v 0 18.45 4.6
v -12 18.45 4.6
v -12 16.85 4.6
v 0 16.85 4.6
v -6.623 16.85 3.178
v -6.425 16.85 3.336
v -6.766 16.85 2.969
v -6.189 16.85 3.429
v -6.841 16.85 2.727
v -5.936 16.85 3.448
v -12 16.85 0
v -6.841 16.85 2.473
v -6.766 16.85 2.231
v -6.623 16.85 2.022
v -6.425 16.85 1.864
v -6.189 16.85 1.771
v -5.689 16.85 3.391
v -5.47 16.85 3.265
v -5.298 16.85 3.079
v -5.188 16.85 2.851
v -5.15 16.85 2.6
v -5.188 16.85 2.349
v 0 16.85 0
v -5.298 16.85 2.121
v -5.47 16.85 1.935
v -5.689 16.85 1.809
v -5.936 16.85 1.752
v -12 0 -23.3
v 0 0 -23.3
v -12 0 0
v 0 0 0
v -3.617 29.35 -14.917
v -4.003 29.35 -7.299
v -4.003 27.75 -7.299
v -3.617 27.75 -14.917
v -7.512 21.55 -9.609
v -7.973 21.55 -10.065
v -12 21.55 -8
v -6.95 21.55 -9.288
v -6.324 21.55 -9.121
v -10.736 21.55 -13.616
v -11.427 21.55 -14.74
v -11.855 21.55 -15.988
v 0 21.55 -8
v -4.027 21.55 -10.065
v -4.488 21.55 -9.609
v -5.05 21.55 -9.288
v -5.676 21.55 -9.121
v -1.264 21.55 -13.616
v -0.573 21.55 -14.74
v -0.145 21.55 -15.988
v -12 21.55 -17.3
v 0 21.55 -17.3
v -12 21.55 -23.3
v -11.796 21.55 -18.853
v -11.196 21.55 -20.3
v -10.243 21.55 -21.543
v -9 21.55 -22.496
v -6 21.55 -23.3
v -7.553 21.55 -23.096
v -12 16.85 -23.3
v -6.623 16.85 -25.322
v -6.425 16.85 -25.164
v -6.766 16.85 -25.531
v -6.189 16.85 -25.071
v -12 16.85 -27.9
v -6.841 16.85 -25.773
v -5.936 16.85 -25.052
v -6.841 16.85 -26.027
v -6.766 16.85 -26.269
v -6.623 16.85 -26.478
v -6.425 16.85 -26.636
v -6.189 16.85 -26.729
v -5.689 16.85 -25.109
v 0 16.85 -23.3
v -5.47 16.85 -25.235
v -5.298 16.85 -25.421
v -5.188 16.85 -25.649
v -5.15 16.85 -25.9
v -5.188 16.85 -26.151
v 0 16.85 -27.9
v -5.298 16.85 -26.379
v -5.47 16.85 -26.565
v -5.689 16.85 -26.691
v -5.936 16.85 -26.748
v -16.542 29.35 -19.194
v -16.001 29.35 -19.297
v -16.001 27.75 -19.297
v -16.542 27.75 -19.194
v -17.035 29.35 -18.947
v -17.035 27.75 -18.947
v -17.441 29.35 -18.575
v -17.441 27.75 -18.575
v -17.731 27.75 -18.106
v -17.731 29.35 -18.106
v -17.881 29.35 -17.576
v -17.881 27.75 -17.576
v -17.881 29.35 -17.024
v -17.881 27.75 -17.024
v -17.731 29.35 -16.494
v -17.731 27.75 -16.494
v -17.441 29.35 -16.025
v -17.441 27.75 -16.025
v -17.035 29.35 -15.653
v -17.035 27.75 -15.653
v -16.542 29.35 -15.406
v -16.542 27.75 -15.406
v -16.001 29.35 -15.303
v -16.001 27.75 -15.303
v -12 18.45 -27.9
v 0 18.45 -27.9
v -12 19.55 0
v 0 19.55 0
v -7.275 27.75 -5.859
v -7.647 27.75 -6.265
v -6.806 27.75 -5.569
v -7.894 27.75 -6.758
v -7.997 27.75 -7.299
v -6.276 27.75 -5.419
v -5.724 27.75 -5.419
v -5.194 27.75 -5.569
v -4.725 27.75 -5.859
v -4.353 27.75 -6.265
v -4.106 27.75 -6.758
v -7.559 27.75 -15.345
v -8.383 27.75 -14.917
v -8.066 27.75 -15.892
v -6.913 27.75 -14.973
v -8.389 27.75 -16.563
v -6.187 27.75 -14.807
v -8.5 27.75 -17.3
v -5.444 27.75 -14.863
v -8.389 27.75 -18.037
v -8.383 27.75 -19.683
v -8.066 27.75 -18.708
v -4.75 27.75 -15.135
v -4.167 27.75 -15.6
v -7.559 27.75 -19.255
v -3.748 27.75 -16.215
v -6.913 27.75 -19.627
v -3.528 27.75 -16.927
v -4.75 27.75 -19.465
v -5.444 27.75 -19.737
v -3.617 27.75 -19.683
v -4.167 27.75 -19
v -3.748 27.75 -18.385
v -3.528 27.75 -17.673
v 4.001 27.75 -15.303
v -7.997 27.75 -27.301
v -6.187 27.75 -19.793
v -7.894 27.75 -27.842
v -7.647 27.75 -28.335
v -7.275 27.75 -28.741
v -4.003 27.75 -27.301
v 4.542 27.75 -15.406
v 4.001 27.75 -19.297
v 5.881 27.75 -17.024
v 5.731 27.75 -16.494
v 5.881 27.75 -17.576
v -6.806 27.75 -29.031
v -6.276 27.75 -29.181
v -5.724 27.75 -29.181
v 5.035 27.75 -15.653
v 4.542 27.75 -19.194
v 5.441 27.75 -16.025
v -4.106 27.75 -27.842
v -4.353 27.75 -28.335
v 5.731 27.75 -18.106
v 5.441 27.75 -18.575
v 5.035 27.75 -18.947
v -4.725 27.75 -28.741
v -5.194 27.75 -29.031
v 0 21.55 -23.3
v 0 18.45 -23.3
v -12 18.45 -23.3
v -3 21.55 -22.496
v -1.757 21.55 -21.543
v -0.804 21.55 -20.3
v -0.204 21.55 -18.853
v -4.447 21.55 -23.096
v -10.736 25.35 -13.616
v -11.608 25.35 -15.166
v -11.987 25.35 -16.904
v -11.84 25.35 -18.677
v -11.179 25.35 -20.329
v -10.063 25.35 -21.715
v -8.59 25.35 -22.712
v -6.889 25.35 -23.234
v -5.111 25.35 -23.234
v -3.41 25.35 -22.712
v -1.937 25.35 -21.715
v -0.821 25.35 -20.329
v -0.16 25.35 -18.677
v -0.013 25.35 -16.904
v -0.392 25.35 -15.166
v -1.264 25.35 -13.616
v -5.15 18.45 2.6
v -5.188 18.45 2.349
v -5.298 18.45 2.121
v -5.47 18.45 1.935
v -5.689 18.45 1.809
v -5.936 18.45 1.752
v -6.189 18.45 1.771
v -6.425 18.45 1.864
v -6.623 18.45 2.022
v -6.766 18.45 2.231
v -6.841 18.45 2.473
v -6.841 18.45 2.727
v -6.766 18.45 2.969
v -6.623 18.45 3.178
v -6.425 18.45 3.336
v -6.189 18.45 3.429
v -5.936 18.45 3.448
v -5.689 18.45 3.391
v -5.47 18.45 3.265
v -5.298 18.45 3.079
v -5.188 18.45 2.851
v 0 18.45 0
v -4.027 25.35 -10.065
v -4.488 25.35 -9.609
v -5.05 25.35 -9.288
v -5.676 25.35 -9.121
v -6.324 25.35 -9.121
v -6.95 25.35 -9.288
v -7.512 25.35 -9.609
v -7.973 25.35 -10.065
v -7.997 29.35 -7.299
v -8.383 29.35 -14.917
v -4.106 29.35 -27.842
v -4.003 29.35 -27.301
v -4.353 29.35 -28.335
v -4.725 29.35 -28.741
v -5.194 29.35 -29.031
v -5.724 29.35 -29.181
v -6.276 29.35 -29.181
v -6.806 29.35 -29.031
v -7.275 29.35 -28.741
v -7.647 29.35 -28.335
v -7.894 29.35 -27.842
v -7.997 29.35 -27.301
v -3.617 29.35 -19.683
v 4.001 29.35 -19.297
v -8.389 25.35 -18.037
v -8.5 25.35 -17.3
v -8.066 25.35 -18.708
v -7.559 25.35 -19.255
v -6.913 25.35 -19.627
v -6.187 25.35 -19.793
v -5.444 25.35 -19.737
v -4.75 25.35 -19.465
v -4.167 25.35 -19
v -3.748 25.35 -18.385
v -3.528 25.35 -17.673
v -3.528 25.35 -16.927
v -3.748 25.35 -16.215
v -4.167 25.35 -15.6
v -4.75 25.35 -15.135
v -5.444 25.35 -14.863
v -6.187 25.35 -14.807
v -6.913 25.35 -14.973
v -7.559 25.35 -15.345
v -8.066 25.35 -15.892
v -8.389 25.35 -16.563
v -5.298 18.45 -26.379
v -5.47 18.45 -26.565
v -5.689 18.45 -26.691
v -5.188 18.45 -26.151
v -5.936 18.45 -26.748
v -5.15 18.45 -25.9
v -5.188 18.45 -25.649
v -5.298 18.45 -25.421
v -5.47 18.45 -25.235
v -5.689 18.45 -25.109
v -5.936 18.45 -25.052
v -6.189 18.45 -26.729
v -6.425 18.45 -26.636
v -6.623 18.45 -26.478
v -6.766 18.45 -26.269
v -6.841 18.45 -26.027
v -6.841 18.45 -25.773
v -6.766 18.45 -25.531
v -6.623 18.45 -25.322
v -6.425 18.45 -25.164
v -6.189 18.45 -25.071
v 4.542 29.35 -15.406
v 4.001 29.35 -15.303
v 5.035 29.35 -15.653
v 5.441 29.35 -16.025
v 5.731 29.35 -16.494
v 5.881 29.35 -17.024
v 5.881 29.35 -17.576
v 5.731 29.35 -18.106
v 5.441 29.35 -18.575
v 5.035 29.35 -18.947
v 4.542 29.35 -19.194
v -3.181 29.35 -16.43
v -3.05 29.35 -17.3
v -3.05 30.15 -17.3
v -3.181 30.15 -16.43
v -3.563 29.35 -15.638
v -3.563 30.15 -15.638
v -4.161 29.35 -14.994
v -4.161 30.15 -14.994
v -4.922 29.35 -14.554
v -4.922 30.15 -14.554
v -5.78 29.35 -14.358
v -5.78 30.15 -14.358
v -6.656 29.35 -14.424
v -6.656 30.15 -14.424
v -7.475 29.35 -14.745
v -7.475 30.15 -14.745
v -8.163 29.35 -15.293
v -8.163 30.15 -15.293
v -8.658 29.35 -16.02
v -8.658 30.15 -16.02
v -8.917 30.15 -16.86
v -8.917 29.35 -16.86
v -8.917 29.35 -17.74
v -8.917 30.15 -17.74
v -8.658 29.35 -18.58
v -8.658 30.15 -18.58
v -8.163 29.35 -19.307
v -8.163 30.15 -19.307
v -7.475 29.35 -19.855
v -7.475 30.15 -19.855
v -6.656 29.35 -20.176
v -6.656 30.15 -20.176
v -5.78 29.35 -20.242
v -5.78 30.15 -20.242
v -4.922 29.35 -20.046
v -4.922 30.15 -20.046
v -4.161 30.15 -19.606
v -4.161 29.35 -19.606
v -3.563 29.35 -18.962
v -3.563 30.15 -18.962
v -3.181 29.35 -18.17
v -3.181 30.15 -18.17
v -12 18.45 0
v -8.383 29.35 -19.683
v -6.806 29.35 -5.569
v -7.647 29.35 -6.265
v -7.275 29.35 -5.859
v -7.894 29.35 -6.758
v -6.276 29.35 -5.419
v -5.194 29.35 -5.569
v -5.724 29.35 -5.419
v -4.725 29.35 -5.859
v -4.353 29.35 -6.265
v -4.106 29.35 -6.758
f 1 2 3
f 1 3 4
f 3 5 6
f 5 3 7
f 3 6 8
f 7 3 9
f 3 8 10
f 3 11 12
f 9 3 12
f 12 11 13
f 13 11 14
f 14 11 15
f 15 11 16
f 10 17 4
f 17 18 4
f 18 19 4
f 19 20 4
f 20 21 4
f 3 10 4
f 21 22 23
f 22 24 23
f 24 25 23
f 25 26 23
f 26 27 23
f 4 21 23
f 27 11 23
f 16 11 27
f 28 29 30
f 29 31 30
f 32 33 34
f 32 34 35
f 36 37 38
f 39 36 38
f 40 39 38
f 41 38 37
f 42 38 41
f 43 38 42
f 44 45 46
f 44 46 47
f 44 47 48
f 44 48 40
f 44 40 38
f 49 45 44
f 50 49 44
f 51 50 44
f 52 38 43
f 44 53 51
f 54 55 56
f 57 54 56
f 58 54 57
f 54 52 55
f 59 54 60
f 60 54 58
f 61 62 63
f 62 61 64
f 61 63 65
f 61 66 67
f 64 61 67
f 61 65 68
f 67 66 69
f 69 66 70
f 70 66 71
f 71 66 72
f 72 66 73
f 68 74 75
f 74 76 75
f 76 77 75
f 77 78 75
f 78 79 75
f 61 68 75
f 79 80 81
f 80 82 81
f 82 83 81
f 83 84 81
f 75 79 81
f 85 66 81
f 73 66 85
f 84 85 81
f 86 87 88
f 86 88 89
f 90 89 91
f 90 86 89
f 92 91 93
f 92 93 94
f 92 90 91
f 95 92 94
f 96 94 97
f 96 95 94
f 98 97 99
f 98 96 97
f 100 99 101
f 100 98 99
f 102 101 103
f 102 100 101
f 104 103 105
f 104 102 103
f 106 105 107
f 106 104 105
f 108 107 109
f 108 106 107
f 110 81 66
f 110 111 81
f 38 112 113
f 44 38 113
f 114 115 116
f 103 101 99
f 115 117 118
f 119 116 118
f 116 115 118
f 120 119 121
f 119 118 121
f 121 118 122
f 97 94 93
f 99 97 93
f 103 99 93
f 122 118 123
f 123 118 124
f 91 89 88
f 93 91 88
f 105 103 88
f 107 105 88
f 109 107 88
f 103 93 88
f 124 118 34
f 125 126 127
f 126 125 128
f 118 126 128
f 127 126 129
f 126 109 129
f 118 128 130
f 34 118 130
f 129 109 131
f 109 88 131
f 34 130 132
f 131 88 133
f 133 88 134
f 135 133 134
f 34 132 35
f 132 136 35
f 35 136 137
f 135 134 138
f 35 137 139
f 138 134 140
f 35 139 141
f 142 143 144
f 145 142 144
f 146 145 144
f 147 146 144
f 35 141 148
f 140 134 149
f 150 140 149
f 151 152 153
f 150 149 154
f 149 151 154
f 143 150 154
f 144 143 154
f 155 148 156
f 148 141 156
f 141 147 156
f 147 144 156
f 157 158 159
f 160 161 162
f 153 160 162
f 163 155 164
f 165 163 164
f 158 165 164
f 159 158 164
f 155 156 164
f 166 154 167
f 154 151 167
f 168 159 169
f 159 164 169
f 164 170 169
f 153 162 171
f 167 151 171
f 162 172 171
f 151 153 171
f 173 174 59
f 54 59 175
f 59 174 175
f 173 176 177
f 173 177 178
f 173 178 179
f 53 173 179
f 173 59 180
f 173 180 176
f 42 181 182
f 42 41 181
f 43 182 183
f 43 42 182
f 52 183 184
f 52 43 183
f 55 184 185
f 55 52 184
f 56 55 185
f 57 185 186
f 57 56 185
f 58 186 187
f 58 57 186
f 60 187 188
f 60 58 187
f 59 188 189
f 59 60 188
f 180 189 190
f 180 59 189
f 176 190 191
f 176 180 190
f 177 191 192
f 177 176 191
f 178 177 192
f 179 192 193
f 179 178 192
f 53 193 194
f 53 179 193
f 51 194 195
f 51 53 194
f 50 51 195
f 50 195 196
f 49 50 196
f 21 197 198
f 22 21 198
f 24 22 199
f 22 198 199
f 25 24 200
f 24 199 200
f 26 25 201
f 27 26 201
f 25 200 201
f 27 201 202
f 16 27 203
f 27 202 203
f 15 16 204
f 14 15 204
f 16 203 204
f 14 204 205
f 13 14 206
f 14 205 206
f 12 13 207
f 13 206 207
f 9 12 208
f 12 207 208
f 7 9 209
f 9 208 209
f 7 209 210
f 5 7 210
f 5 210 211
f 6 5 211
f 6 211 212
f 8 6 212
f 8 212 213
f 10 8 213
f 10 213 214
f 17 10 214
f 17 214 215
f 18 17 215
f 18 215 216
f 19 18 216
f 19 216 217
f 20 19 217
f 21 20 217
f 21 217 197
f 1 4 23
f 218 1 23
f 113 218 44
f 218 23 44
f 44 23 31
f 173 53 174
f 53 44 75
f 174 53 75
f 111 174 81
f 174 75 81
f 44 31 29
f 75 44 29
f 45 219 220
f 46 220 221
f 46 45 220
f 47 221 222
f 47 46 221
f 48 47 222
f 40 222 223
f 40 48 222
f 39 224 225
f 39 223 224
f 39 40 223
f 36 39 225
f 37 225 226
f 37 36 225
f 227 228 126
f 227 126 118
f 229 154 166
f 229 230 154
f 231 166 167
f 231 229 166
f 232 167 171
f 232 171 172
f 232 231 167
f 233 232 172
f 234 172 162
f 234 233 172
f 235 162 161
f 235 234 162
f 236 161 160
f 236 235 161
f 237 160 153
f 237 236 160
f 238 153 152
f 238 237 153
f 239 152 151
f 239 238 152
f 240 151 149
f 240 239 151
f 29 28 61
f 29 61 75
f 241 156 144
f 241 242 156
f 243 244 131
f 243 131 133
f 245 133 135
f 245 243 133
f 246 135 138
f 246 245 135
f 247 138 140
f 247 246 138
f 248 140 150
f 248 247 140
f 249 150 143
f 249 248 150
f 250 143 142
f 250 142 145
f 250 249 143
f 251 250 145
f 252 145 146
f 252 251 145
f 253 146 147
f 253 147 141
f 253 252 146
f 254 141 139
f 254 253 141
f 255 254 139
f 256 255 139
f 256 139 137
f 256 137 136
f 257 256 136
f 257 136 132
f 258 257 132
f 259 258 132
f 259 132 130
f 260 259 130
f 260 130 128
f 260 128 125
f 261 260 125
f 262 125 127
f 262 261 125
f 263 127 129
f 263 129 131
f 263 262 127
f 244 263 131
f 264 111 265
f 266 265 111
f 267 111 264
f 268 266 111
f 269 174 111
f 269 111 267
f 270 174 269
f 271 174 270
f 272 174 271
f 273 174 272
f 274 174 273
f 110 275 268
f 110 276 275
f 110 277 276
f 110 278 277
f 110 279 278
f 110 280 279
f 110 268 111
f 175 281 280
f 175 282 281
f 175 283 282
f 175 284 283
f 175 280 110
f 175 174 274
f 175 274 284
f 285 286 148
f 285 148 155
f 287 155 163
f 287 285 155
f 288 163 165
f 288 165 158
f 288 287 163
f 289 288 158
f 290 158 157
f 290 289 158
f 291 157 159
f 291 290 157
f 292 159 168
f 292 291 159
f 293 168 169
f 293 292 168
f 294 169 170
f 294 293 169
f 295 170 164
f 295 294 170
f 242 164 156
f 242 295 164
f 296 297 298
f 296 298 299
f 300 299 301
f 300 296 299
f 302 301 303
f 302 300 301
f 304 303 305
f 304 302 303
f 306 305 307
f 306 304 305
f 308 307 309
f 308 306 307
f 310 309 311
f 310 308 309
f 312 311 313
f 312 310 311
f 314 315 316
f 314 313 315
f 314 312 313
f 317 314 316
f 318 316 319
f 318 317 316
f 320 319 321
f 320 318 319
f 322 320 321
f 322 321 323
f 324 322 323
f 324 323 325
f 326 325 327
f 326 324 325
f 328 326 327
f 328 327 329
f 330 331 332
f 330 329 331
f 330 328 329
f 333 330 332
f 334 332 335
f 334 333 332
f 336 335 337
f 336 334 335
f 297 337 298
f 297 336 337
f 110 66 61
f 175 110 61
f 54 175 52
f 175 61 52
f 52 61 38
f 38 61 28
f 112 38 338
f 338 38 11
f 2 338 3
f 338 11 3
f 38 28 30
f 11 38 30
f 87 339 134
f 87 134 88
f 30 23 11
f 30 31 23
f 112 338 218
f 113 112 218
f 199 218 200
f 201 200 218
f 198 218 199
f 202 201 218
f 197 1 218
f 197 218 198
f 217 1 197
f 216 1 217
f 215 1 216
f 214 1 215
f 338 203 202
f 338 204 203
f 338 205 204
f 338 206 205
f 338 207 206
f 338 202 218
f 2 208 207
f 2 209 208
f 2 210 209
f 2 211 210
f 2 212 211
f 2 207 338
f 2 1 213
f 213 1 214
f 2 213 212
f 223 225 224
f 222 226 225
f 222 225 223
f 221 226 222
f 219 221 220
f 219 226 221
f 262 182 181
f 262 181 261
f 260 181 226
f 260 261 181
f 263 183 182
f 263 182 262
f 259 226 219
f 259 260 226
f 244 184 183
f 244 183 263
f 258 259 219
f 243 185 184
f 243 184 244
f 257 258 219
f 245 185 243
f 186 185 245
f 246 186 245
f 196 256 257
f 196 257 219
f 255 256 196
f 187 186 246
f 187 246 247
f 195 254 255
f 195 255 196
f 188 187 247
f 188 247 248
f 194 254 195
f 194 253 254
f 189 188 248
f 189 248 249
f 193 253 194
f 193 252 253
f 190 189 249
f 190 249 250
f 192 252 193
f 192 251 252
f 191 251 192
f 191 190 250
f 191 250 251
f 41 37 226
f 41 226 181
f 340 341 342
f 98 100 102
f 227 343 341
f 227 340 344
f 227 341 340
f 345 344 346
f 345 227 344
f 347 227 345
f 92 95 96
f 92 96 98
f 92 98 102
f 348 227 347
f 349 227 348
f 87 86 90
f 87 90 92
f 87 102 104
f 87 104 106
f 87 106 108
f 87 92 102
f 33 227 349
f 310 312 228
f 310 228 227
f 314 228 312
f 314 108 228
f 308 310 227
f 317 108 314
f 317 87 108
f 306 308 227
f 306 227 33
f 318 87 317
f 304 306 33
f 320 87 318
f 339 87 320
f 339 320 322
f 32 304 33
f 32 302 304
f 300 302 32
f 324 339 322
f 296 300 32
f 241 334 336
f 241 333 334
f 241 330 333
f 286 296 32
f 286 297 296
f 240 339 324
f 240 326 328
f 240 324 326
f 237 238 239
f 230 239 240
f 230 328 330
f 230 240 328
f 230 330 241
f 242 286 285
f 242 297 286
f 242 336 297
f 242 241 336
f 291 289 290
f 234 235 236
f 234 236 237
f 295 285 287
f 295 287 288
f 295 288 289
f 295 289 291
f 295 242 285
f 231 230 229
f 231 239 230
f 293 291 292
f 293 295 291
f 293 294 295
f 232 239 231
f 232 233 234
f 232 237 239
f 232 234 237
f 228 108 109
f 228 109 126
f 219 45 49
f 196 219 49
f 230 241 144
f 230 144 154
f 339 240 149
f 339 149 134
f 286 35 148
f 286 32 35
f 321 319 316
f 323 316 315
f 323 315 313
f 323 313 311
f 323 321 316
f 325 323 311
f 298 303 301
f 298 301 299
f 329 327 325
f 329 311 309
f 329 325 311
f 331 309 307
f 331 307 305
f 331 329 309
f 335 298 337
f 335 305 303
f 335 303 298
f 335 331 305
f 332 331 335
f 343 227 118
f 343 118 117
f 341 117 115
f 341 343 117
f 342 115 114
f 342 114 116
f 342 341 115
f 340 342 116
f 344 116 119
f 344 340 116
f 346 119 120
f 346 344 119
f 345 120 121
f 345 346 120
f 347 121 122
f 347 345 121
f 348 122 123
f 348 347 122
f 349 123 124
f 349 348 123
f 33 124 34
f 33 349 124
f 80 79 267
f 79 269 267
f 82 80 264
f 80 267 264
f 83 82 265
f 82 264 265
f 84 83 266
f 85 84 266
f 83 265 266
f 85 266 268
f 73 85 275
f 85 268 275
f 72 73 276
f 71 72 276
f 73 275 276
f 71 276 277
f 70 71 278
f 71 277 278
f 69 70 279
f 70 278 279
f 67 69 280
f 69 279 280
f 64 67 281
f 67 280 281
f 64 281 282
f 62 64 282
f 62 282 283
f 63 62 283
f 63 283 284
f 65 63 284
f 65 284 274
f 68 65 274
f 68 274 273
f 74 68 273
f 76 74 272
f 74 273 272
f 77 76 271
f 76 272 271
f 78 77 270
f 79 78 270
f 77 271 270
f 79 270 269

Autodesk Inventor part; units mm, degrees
ref_plane "YZ Plane" through (0, 0, 0) normal (1, 0, 0) x (0, 1, 0)
ref_plane "XZ Plane" through (0, 0, 0) normal (0, 1, 0) x (-1, 0, 0)
sketch "スケッチ1" plane through (0, 0, 0) normal (0, 1, 0) x (-1, 0, 0)
  line L0 (0, 0) -> (12, 0)
  line L1 (12, 0) -> (12, -23.3)
  line L2 (12, -23.3) -> (0, -23.3)
  line L3 (0, -23.3) -> (0, 0)
  dimension "d0" = 23.3
  dimension "d1" = 12
extrude "押し出し1" add sketch "スケッチ1" along normal blind 18.45
sketch "スケッチ2" plane through (0, 18.45, 0) normal (0, 1, 0) x (1, 0, 0)
  circle A0 centre (-6, 17.3) radius 6
  line L0 (-12, 23.3) -> (-12, 0)
  line L1 (0, 0) -> (0, 23.3)
  line L2 (0, 23.3) -> (-12, 23.3)
  circle A1 centre (-6, 11.6) radius 2.5
  line L3 (-7.973197, 10.064912) -> (-10.735672, 13.615789)
  line L4 (-4.026803, 10.064912) -> (-1.264328, 13.615789)
  point P0 (-8.488419, 11.840351)
  point P1 (-3.511581, 11.840351)
  dimension "d20" = 5.7
  dimension "d21" = 5
extrude "押し出し2" add sketch "スケッチ2" along normal blind 6.9 contours A0 A1 | L4 A1 A0 | A1 A0 | A0 A1 | A1 L3 A0
sketch "スケッチ3" plane through (-6, 25.35, -17.3) normal (0, 1, 0) x (-1, 0, 0)
  arc A0 (-4.735672, 3.684211) -> (4.735672, 3.684211) centre (0, 0) ccw
  circle A1 centre (0, 0) radius 2.5
  point P0 (-6, 17.3)
  point P1 (-2.386497, 4.955263)
  point P2 (2.386497, 4.955263)
  dimension "d6" = 5
extrude "押し出し3" add sketch "スケッチ3" along normal blind 3.1
sketch "スケッチ4" plane through (0, 18.45, 0) normal (0, 1, 0) x (1, 0, 0)
  line L0 (0, 0) -> (0, 23.3) projected
  line L1 (0, 17.3) -> (0, 23.3) projected
  line L2 (0, 0) -> (0, 17.3) projected
  line L3 (0, 23.3) -> (-12, 23.3) projected
  line L4 (0, 0) -> (0, 23.3) projected
  line L5 (-12, 0) -> (0, 0) projected
  line L6 (-12, 23.3) -> (-12, 0) projected
  line L7 (-12, -4.6) -> (0, -4.6)
  line L8 (0, -4.6) -> (0, 27.9)
  line L9 (0, 27.9) -> (-12, 27.9)
  line L10 (-12, 27.9) -> (-12, -4.6)
  line L11 (-12, -2.6) -> (0, -2.6) construction
  line L12 (0, -2.6) -> (0, 25.9) construction
  line L13 (0, 25.9) -> (-12, 25.9) construction
  line L14 (-12, 25.9) -> (-12, -2.6) construction
  line L15 (0, 17.3) -> (0, 23.3) projected
  circle A0 centre (-6, -2.6) radius 0.85
  circle A1 centre (-6, 25.9) radius 0.85
  point P0 (-12, 11.65)
  point P1 (-12, 23.3)
  dimension "d9" = 32.5
  dimension "d10" = 28.5
  dimension "d11" = 1.7
  dimension "d12" = 1.7
extrude "押し出し4" add sketch "スケッチ4" against normal blind 1.6 contours L8 L7 L10 L5 | L3 L10 L9 L8
sketch "スケッチ5" plane through (0, 18.45, 0) normal (0, 1, 0) x (1, 0, 0)
  line L0 (0, 23.3) -> (-12, 23.3) projected
  line L1 (0, 0) -> (0, 23.3) projected
  line L2 (-12, 0) -> (0, 0) projected
  line L3 (-12, 23.3) -> (-12, 0) projected
extrude "押し出し5" add sketch "スケッチ5" along normal blind 3.1
chamfer "面取り1" distance 8 distance2 2 1 edges at (-6, 21.55, 0) measured on face at (-6, 21.55, -3.0333)
ref_plane "作業平面1" through (0, 29.35, 0) normal (0, 1, 0) x (1, 0, 0)
sketch "スケッチ6" plane through (0, 29.35, 0) normal (0, 1, 0) x (1, 0, 0)
  circle A0 centre (-6, 17.3) radius 2.5
  circle A1 centre (-6, 17.3) radius 11.9
  circle A2 centre (-6, 27.2) radius 2
  circle A3 centre (-15.9, 17.3) radius 2
  circle A4 centre (-6, 7.4) radius 2
  circle A5 centre (3.9, 17.3) radius 2
  line L0 (4.00101, 19.297448) -> (-5.873737, 19.79681)
  line L1 (-5.873737, 14.80319) -> (4.00101, 15.302552)
  line L2 (-7.997448, 27.30101) -> (-8.49681, 17.426263)
  line L3 (-3.50319, 17.426263) -> (-4.002552, 27.30101)
  line L4 (-16.00101, 15.302552) -> (-6.126263, 14.80319)
  line L5 (-6.126263, 19.79681) -> (-16.00101, 19.297448)
  line L6 (-4.002552, 7.29899) -> (-3.50319, 17.173737)
  line L7 (-8.49681, 17.173737) -> (-7.997448, 7.29899)
  point P0 (0, 0)
  point P1 (-8.382702, 14.917298)
  point P2 (-7.997448, 7.29899)
  point P3 (-4.002552, 7.29899)
  point P4 (-3.617298, 14.917298)
  point P5 (-3.617298, 19.682702)
  point P6 (-4.002552, 27.30101)
  point P7 (-7.997448, 27.30101)
  point P8 (-8.382702, 19.682702)
  point P9 (-16.00101, 19.297448)
  dimension "d34" = 23.8
  dimension "d35" = 4
  dimension "d38" = 360
  dimension "d42" = 360
sketch "スケッチ6 outline for 押し出し6" plane through (0, 29.35, 0) normal (0, 1, 0) x (1, 0, 0)
  line L0 (-8.382702, 14.917298) -> (-7.997448, 7.29899)
  arc A0 (-7.997448, 7.29899) -> (-4.002552, 7.29899) centre (-6, 7.4) ccw
  line L1 (-4.002552, 7.29899) -> (-3.617298, 14.917298)
  line L2 (-3.617298, 14.917298) -> (4.00101, 15.302552)
  arc A1 (4.00101, 15.302552) -> (4.00101, 19.297448) centre (3.9, 17.3) ccw
  line L3 (4.00101, 19.297448) -> (-3.617298, 19.682702)
  line L4 (-3.617298, 19.682702) -> (-4.002552, 27.30101)
  arc A2 (-4.002552, 27.30101) -> (-7.997448, 27.30101) centre (-6, 27.2) ccw
  line L5 (-7.997448, 27.30101) -> (-8.382702, 19.682702)
  line L6 (-8.382702, 19.682702) -> (-16.00101, 19.297448)
  arc A3 (-16.00101, 19.297448) -> (-16.00101, 15.302552) centre (-15.9, 17.3) ccw
  line L7 (-16.00101, 15.302552) -> (-8.382702, 14.917298)
extrude "押し出し6" add sketch "スケッチ6 outline for 押し出し6" against normal blind 1.6
sketch "スケッチ7" plane through (0, 29.35, 0) normal (0, 1, 0) x (1, 0, 0)
  circle A0 centre (-6, 17.3) radius 2.5 projected
  circle A1 centre (-6, 17.3) radius 2.95
  point P0 (0, 0)
  dimension "d46" = 5.9
extrude "押し出し7" add sketch "スケッチ7" along normal blind 0.8 contours A0 | A1
properties part number "FT90MR" material "ABS プラスチック"
